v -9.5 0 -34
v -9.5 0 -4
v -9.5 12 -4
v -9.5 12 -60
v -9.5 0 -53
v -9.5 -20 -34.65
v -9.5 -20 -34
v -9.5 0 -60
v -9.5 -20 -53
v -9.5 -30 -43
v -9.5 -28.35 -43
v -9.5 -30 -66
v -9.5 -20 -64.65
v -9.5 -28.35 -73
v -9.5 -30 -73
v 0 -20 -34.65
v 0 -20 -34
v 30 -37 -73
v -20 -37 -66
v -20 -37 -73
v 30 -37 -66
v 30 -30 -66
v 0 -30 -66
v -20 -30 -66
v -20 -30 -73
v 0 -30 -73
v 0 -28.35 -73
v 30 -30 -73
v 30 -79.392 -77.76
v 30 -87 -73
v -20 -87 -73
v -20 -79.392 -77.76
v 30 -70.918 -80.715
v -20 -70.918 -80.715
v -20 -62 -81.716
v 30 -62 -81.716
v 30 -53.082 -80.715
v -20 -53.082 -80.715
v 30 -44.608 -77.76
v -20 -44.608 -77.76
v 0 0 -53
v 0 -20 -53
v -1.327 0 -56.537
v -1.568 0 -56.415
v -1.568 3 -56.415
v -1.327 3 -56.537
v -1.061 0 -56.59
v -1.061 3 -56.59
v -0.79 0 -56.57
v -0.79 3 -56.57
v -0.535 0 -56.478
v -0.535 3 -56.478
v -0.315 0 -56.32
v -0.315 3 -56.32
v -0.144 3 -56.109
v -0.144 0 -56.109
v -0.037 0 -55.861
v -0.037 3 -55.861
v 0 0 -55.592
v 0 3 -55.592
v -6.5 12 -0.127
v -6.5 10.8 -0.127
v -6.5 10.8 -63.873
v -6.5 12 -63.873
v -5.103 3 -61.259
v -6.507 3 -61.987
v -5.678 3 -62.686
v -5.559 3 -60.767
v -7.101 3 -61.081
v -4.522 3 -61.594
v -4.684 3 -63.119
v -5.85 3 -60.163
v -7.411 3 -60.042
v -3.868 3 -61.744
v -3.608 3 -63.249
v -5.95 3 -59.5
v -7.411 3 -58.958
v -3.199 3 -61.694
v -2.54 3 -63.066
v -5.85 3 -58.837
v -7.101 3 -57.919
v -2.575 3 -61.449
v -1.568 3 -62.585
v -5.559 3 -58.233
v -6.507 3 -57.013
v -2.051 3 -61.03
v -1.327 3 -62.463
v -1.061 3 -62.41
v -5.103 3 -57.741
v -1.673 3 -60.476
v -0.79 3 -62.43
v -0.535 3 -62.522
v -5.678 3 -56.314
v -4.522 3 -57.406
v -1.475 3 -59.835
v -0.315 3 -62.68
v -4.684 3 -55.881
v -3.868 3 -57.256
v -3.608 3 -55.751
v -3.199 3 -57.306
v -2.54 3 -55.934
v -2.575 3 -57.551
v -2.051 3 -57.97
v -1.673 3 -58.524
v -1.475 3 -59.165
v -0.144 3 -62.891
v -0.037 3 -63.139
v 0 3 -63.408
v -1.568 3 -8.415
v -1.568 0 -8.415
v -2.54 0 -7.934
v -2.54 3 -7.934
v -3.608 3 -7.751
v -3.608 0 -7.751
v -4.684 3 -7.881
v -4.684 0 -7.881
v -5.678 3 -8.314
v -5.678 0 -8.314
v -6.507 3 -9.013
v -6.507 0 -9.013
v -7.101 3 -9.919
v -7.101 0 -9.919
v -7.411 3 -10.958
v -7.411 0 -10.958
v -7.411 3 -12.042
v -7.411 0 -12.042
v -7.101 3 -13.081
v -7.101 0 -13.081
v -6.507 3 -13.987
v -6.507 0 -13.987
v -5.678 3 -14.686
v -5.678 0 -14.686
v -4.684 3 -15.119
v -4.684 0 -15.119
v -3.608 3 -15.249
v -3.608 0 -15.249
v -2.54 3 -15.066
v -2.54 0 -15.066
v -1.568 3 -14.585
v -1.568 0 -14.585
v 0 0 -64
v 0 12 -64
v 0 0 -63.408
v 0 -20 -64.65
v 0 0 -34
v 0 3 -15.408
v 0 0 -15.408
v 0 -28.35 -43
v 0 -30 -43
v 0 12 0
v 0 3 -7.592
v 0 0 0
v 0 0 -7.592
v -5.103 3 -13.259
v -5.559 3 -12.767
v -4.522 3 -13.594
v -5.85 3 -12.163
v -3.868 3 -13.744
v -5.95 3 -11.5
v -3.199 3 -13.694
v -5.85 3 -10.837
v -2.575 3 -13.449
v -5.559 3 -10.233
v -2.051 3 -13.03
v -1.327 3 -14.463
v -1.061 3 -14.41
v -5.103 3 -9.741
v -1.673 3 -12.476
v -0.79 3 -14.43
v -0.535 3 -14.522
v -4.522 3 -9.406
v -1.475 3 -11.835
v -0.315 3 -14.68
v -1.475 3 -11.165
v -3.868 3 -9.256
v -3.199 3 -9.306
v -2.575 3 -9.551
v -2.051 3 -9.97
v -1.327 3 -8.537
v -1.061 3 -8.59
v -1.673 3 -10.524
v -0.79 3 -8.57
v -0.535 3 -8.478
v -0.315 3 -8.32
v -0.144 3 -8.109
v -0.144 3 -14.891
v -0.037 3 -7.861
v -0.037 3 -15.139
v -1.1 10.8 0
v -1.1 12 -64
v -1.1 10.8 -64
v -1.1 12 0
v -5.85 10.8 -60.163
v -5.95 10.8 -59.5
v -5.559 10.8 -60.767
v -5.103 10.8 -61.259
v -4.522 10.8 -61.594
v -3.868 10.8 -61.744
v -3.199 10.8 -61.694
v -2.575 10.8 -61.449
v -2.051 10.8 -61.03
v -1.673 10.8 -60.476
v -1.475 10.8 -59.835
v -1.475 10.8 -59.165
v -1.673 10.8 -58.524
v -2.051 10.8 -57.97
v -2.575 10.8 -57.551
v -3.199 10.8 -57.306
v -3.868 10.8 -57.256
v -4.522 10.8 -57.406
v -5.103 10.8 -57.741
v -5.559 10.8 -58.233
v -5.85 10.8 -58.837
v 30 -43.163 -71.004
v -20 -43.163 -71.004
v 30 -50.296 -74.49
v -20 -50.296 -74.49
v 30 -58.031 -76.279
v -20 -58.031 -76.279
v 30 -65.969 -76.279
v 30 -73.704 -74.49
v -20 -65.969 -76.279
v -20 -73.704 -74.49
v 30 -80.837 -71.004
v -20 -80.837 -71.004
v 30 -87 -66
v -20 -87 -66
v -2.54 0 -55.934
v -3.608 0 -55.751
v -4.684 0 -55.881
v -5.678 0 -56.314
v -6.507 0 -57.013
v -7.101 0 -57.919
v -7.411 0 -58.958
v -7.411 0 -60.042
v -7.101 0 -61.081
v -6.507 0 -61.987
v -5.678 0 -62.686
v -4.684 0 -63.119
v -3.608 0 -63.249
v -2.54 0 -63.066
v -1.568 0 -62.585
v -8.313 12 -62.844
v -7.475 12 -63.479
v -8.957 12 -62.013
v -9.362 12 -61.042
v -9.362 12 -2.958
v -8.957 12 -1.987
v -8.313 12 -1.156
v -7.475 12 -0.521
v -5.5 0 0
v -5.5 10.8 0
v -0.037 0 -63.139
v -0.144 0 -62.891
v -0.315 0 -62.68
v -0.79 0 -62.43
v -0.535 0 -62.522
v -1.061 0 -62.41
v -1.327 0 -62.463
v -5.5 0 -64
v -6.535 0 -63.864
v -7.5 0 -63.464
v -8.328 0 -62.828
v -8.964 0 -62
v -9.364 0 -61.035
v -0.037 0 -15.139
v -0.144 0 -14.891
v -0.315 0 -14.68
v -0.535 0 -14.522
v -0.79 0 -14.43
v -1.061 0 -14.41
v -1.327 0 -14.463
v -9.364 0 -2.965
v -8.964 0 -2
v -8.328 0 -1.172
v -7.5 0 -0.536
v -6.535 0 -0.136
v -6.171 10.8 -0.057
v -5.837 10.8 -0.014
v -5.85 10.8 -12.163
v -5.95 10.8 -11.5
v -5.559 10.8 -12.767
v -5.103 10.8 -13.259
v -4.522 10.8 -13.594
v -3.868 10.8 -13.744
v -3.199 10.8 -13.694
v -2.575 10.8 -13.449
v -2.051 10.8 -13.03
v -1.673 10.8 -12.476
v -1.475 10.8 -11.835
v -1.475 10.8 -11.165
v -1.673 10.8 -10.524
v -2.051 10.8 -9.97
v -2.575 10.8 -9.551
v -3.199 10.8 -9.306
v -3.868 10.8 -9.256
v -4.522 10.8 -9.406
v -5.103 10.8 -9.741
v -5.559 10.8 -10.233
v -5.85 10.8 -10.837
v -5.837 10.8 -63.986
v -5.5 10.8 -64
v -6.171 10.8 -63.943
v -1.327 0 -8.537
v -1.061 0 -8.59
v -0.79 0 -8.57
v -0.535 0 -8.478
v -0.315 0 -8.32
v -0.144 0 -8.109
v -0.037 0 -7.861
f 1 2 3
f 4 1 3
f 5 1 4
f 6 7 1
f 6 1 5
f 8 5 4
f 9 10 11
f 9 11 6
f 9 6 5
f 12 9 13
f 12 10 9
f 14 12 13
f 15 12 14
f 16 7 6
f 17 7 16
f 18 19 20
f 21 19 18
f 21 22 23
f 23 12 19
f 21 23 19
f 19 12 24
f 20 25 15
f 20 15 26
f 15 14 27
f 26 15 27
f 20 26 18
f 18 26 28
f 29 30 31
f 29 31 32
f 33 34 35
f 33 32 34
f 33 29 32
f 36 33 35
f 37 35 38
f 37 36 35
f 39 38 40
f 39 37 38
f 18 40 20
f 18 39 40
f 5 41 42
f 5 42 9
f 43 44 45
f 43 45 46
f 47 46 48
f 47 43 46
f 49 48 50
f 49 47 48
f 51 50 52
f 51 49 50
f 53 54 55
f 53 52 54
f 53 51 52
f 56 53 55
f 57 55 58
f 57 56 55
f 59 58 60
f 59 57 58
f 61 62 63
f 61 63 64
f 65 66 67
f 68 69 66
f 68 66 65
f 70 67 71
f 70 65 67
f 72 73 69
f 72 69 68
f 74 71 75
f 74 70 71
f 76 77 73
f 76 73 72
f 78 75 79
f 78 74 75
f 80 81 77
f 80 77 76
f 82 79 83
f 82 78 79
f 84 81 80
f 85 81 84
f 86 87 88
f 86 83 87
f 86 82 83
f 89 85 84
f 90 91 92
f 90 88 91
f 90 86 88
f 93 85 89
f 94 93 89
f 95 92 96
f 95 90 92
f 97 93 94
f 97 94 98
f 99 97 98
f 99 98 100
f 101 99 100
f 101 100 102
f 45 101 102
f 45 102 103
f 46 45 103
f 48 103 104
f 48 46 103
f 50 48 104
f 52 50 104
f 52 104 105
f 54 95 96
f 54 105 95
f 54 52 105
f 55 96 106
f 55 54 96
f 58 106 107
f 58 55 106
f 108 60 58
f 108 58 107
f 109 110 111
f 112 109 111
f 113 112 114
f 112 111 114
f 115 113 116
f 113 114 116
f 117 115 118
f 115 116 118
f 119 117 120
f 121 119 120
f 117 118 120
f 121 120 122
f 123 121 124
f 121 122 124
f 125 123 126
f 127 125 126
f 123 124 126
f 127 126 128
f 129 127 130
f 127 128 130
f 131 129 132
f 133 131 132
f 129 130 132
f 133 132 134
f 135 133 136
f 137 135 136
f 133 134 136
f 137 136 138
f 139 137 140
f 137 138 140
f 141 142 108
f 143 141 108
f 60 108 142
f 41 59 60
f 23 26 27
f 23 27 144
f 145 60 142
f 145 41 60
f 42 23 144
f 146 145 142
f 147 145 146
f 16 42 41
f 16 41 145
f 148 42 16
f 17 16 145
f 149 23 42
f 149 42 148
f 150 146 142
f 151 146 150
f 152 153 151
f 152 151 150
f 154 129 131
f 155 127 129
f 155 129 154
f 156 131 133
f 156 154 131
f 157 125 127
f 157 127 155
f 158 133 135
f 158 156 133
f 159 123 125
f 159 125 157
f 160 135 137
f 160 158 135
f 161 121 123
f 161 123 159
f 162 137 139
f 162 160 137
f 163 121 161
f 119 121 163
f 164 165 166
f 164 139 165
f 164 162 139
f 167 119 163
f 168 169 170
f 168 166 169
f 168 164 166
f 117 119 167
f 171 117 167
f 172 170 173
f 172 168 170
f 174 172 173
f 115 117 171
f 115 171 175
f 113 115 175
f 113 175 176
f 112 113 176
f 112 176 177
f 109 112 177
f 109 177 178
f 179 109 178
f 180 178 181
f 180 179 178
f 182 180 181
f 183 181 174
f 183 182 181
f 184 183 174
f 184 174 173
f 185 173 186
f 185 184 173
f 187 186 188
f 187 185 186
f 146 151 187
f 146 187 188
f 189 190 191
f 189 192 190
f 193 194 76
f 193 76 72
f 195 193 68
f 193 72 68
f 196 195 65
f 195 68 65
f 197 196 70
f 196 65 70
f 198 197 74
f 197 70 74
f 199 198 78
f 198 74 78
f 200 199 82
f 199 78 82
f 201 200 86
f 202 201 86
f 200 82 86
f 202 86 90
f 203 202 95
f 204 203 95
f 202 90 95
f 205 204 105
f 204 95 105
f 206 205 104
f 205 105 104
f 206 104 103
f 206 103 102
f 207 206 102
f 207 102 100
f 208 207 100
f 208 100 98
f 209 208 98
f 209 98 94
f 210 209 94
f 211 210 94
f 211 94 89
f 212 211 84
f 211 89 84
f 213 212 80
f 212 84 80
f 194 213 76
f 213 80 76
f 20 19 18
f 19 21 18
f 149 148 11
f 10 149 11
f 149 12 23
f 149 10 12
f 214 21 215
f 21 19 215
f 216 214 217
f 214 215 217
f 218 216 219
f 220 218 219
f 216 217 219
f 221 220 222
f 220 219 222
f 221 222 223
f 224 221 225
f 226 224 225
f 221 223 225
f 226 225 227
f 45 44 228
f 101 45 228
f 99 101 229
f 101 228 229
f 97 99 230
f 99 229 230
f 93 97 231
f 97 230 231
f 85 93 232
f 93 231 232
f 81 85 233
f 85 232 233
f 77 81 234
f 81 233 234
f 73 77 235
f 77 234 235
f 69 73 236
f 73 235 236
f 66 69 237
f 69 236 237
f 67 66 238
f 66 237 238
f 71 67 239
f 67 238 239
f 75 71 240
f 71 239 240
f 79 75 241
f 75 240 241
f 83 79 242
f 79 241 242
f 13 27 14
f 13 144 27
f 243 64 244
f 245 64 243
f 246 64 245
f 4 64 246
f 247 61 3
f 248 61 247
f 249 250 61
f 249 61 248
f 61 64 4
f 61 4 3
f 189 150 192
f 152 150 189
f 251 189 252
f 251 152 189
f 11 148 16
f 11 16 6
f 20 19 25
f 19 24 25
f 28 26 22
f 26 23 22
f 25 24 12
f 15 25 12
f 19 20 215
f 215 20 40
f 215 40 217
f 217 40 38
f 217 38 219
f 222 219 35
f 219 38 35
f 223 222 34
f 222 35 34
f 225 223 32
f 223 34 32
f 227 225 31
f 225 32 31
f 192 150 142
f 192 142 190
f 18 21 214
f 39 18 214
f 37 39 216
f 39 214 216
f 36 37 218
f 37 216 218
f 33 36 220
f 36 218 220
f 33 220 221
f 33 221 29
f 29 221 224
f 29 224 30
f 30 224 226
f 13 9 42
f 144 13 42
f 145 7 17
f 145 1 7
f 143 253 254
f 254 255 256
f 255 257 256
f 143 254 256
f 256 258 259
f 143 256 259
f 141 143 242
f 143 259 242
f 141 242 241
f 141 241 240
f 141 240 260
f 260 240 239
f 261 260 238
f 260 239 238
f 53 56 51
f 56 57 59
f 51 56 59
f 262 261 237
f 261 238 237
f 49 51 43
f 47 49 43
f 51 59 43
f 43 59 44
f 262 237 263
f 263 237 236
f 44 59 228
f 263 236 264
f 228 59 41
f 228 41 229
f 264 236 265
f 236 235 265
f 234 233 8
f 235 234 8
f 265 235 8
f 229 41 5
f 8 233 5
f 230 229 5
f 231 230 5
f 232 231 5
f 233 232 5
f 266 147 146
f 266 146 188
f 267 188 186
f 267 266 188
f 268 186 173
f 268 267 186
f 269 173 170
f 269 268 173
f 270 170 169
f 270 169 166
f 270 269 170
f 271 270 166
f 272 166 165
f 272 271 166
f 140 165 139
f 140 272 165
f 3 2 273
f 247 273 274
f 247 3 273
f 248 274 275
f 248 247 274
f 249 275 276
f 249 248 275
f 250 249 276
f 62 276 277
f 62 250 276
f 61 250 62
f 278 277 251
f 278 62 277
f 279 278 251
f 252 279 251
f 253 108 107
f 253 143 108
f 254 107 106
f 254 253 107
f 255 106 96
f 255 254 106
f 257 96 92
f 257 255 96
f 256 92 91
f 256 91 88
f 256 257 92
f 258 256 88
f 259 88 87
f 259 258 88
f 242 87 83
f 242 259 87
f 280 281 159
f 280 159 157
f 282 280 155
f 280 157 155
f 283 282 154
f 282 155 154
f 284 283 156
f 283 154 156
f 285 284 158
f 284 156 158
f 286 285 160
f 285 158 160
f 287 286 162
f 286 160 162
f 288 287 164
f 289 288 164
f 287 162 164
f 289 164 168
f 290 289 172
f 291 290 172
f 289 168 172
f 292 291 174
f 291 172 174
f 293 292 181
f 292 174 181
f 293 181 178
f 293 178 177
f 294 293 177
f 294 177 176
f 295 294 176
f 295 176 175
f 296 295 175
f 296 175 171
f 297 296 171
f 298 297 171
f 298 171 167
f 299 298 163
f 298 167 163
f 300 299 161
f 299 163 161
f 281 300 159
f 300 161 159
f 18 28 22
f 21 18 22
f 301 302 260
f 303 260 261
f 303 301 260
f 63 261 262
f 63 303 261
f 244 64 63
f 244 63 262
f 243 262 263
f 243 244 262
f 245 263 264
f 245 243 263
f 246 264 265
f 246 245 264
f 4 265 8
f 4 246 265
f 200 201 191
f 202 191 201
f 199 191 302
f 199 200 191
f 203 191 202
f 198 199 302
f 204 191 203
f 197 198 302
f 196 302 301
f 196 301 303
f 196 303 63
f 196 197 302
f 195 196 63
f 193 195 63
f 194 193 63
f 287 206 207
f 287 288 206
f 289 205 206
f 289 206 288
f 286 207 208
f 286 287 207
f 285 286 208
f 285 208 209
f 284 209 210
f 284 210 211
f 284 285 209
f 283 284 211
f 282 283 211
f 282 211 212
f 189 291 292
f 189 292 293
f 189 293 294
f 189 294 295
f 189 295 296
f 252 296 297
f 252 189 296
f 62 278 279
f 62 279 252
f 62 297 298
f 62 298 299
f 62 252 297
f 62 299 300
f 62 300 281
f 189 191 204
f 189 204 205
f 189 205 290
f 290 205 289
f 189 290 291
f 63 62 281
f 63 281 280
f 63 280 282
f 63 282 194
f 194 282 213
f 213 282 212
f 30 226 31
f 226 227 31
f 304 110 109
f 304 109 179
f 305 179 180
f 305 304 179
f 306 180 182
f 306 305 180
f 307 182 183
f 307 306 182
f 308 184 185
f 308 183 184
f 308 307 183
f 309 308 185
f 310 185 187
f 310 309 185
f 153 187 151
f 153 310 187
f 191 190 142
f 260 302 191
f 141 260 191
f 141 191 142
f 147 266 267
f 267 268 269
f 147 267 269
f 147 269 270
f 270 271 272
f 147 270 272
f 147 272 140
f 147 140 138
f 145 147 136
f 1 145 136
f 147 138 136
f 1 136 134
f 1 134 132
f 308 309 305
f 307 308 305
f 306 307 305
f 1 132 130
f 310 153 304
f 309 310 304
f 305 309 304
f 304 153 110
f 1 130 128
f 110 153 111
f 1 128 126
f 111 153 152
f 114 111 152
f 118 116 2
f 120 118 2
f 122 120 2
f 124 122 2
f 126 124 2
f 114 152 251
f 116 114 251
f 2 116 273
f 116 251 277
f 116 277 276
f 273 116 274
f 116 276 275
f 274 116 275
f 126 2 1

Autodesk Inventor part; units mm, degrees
ref_plane "YZ Plane" through (0, 0, 0) normal (1, 0, 0) x (0, 1, 0)
ref_plane "XZ Plane" through (0, 0, 0) normal (0, 1, 0) x (-1, 0, 0)
ref_plane "XY Plane" through (0, 0, 0) normal (0, 0, 1) x (1, 0, 0)
sketch "Sketch1" plane through (0, 0, 0) normal (0, 1, 0) x (-1, 0, 0)
  line L0 (0, 0) -> (9.5, 0)
  line L1 (9.5, 0) -> (9.5, -64)
  line L2 (9.5, -64) -> (0, -64)
  line L3 (0, -64) -> (0, 0)
  circle A0 centre (3.7, -11.5) radius 2.25
  circle A1 centre (3.7, -59.5) radius 2.25
  line L4 (3.7, -11.5) -> (3.7, -59.5) construction
  dimension "d1" = 9.5
  dimension "d2" = 64
  dimension "d3" = 4.5
  dimension "d4" = 48
  dimension "d6" = 3.7
  dimension "d17" = 4.5
extrude "Extrusion1" add sketch "Sketch1" along normal blind 12
sketch "Sketch2" plane through (-9.5, 0, 0) normal (0, 0, 1) x (1, 0, 0)
  line L0 (9.5, 12) -> (0, 12) projected
  line L1 (3, 12) -> (8.4, 12)
  line L2 (8.4, 12) -> (8.4, 10.8)
  line L3 (8.4, 10.8) -> (3, 10.8)
  line L4 (3, 10.8) -> (3, 12)
  line L5 (9.5, 0) -> (9.5, 12) projected
  line L6 (3.55, 0) -> (8.05, 0) projected
  line L7 (3.55, 12) -> (8.05, 12) projected
  line L8 (9.5, 0) -> (9.5, 12) projected
  line L9 (9.5, 0) -> (9.5, 12) projected
  line L10 (3.55, 12) -> (8.05, 12) projected
  line L11 (3.55, 12) -> (3.55, 0) projected
  line L12 (3.55, 12) -> (8.05, 12) projected
  line L13 (3.55, 0) -> (8.05, 0) projected
  line L14 (3.55, 12) -> (8.05, 12) projected
  line L15 (3.55, 0) -> (8.05, 0) projected
  line L16 (3.55, 12) -> (8.05, 12) projected
  line L17 (3.55, 0) -> (8.05, 0) projected
  dimension "d9" = 1.1
  dimension "d10" = 5.4
  dimension "d11" = 1.2
  dimension "d76" = 12
extrude "Extrusion2" cut sketch "Sketch2" against normal up to next
sketch "Sketch3" plane through (0, 0, 0) normal (0, -1, 0) x (1, 0, 0)
  circle A0 centre (-3.7, -11.5) radius 2.25 projected
  circle A1 centre (-3.7, -11.5) radius 3.75
  circle A2 centre (-3.7, -59.5) radius 2.25 projected
  circle A3 centre (-3.7, -59.5) radius 3.75
  point P0 (0, 0)
  dimension "d14" = 7.5
extrude "Extrusion3" cut sketch "Sketch3" against normal blind 3
fillet "Fillet1" radius 1 4 edges at (0, 1.5, -58.8897) (0, 1.5, -60.1103) (0, 1.5, -10.8897) (0, 1.5, -12.1103)
fillet "Fillet2" radius 4 2 edges at (-9.5, 6, -64) (-9.5, 6, 0)
sketch "Sketch28" plane through (0, 0, 0) normal (0, -1, 0) x (1, 0, 0)
  arc A0 (-1.5684, -56.4147) -> (0, -55.592) centre (-1, -55.592) ccw projected
  line L0 (0, -55.592) -> (0, -53)
  line L1 (0, -15.408) -> (0, -55.592) projected
  line L2 (-9.5, -60) -> (-9.5, -4) projected
  line L3 (0, -53) -> (-9.5, -53)
  line L4 (-9.5, -53) -> (-9.5, -34)
  line L5 (-9.5, -34) -> (0, -34)
  line L6 (0, -34) -> (0, -53)
  point P0 (0, 0)
  point P1 (0, -34)
  dimension "d107" = 2.592
  dimension "d108" = 19
extrude "Extrusion19" add sketch "Sketch28" along normal blind 20
sketch "Sketch40" plane through (0, -20, 0) normal (0, -1, 0) x (1, 0, 0)
  line L0 (0, -53) -> (-9.5, -53) projected
  line L1 (-9.5, -53) -> (-9.5, -73)
  line L2 (-9.5, -73) -> (0, -73)
  line L3 (0, -73) -> (0, -43)
  line L4 (0, 0) -> (0, -64) projected
  line L5 (0, -43) -> (-9.5, -43)
  line L6 (-9.5, -43) -> (-9.5, -53)
  line L7 (-9.5, -43) -> (0, -43)
  line L8 (0, -43) -> (0, -73)
  line L9 (0, -73) -> (-9.5, -73)
  line L10 (-9.5, -73) -> (-9.5, -43)
  dimension "d130" = 20
  dimension "d131" = 30
extrude "Extrusion21" add sketch "Sketch40" along normal blind 10
sketch "Sketch41" plane through (0, 0, -53) normal (0, 0, -1) x (-1, 0, 0)
  point P0 (0, 0)
sketch "Sketch42" plane through (0, -30, 0) normal (0, -1, 0) x (1, 0, 0)
  line L0 (0, -73) -> (0, -53) projected
  line L1 (0, -73) -> (30, -73)
  line L2 (30, -73) -> (30, -66)
  line L3 (30, -66) -> (-20, -66)
  line L4 (-20, -66) -> (-20, -73)
  line L5 (-20, -73) -> (0, -73)
  point P0 (0, 0)
  dimension "d134" = 30
  dimension "d135" = 7
  dimension "d137" = 50
extrude "Extrusion22" add sketch "Sketch42" along normal blind 7
sketch "Sketch50" plane through (-20, -30, -73) normal (-1, 0, 0) x (0, 0, 1)
  arc A0 (7, -7) -> (7, -57) centre (31.4949, -32) ccw
  point P0 (73, 30)
  dimension "d147" = 50
  dimension "d148" = 35
sketch "Sketch51" plane through (0, -37, 0) normal (0, -1, 0) x (1, 0, 0)
  line L0 (-20, -73) -> (30, -73) projected
  line L1 (30, -66) -> (-20, -66) projected
  line L2 (-20, -73) -> (30, -73)
  line L3 (30, -73) -> (30, -66)
  line L4 (30, -66) -> (-20, -66)
  line L5 (-20, -66) -> (-20, -73)
  point P0 (0, 0)
sweep "Sweep4" add profiles "Sketch51" path "Sketch50" separate body
sketch "Sketch57" plane through (-20, -37, -73) normal (-1, 0, 0) x (0, 0, 1)
  arc A0 (7, 0) -> (7, -50) centre (31.4949, -25) ccw projected
  line L0 (7, -50) -> (-5.0576, -50)
  line L1 (-5.0576, -50) -> (-5.0576, -59.7183)
  line L2 (-5.0576, -50) -> (16.6451, -50)
  line L3 (16.6451, -50) -> (16.6451, -65.0945)
  line L4 (16.6451, -65.0945) -> (-5.0576, -65.0945)
  line L5 (-5.0576, -65.0945) -> (-5.0576, -50)
  point P0 (73, 37)
extrude "Extrusion24" cut sketch "Sketch57" against normal blind 97.95 bodies 2
chamfer "Chamfer4" distance 8.35 angle 45 1 edges at (-4.75, -20, -43)
chamfer "Chamfer5" distance 8.35 angle 45 1 edges at (-4.75, -20, -73)
properties part number "Back"
